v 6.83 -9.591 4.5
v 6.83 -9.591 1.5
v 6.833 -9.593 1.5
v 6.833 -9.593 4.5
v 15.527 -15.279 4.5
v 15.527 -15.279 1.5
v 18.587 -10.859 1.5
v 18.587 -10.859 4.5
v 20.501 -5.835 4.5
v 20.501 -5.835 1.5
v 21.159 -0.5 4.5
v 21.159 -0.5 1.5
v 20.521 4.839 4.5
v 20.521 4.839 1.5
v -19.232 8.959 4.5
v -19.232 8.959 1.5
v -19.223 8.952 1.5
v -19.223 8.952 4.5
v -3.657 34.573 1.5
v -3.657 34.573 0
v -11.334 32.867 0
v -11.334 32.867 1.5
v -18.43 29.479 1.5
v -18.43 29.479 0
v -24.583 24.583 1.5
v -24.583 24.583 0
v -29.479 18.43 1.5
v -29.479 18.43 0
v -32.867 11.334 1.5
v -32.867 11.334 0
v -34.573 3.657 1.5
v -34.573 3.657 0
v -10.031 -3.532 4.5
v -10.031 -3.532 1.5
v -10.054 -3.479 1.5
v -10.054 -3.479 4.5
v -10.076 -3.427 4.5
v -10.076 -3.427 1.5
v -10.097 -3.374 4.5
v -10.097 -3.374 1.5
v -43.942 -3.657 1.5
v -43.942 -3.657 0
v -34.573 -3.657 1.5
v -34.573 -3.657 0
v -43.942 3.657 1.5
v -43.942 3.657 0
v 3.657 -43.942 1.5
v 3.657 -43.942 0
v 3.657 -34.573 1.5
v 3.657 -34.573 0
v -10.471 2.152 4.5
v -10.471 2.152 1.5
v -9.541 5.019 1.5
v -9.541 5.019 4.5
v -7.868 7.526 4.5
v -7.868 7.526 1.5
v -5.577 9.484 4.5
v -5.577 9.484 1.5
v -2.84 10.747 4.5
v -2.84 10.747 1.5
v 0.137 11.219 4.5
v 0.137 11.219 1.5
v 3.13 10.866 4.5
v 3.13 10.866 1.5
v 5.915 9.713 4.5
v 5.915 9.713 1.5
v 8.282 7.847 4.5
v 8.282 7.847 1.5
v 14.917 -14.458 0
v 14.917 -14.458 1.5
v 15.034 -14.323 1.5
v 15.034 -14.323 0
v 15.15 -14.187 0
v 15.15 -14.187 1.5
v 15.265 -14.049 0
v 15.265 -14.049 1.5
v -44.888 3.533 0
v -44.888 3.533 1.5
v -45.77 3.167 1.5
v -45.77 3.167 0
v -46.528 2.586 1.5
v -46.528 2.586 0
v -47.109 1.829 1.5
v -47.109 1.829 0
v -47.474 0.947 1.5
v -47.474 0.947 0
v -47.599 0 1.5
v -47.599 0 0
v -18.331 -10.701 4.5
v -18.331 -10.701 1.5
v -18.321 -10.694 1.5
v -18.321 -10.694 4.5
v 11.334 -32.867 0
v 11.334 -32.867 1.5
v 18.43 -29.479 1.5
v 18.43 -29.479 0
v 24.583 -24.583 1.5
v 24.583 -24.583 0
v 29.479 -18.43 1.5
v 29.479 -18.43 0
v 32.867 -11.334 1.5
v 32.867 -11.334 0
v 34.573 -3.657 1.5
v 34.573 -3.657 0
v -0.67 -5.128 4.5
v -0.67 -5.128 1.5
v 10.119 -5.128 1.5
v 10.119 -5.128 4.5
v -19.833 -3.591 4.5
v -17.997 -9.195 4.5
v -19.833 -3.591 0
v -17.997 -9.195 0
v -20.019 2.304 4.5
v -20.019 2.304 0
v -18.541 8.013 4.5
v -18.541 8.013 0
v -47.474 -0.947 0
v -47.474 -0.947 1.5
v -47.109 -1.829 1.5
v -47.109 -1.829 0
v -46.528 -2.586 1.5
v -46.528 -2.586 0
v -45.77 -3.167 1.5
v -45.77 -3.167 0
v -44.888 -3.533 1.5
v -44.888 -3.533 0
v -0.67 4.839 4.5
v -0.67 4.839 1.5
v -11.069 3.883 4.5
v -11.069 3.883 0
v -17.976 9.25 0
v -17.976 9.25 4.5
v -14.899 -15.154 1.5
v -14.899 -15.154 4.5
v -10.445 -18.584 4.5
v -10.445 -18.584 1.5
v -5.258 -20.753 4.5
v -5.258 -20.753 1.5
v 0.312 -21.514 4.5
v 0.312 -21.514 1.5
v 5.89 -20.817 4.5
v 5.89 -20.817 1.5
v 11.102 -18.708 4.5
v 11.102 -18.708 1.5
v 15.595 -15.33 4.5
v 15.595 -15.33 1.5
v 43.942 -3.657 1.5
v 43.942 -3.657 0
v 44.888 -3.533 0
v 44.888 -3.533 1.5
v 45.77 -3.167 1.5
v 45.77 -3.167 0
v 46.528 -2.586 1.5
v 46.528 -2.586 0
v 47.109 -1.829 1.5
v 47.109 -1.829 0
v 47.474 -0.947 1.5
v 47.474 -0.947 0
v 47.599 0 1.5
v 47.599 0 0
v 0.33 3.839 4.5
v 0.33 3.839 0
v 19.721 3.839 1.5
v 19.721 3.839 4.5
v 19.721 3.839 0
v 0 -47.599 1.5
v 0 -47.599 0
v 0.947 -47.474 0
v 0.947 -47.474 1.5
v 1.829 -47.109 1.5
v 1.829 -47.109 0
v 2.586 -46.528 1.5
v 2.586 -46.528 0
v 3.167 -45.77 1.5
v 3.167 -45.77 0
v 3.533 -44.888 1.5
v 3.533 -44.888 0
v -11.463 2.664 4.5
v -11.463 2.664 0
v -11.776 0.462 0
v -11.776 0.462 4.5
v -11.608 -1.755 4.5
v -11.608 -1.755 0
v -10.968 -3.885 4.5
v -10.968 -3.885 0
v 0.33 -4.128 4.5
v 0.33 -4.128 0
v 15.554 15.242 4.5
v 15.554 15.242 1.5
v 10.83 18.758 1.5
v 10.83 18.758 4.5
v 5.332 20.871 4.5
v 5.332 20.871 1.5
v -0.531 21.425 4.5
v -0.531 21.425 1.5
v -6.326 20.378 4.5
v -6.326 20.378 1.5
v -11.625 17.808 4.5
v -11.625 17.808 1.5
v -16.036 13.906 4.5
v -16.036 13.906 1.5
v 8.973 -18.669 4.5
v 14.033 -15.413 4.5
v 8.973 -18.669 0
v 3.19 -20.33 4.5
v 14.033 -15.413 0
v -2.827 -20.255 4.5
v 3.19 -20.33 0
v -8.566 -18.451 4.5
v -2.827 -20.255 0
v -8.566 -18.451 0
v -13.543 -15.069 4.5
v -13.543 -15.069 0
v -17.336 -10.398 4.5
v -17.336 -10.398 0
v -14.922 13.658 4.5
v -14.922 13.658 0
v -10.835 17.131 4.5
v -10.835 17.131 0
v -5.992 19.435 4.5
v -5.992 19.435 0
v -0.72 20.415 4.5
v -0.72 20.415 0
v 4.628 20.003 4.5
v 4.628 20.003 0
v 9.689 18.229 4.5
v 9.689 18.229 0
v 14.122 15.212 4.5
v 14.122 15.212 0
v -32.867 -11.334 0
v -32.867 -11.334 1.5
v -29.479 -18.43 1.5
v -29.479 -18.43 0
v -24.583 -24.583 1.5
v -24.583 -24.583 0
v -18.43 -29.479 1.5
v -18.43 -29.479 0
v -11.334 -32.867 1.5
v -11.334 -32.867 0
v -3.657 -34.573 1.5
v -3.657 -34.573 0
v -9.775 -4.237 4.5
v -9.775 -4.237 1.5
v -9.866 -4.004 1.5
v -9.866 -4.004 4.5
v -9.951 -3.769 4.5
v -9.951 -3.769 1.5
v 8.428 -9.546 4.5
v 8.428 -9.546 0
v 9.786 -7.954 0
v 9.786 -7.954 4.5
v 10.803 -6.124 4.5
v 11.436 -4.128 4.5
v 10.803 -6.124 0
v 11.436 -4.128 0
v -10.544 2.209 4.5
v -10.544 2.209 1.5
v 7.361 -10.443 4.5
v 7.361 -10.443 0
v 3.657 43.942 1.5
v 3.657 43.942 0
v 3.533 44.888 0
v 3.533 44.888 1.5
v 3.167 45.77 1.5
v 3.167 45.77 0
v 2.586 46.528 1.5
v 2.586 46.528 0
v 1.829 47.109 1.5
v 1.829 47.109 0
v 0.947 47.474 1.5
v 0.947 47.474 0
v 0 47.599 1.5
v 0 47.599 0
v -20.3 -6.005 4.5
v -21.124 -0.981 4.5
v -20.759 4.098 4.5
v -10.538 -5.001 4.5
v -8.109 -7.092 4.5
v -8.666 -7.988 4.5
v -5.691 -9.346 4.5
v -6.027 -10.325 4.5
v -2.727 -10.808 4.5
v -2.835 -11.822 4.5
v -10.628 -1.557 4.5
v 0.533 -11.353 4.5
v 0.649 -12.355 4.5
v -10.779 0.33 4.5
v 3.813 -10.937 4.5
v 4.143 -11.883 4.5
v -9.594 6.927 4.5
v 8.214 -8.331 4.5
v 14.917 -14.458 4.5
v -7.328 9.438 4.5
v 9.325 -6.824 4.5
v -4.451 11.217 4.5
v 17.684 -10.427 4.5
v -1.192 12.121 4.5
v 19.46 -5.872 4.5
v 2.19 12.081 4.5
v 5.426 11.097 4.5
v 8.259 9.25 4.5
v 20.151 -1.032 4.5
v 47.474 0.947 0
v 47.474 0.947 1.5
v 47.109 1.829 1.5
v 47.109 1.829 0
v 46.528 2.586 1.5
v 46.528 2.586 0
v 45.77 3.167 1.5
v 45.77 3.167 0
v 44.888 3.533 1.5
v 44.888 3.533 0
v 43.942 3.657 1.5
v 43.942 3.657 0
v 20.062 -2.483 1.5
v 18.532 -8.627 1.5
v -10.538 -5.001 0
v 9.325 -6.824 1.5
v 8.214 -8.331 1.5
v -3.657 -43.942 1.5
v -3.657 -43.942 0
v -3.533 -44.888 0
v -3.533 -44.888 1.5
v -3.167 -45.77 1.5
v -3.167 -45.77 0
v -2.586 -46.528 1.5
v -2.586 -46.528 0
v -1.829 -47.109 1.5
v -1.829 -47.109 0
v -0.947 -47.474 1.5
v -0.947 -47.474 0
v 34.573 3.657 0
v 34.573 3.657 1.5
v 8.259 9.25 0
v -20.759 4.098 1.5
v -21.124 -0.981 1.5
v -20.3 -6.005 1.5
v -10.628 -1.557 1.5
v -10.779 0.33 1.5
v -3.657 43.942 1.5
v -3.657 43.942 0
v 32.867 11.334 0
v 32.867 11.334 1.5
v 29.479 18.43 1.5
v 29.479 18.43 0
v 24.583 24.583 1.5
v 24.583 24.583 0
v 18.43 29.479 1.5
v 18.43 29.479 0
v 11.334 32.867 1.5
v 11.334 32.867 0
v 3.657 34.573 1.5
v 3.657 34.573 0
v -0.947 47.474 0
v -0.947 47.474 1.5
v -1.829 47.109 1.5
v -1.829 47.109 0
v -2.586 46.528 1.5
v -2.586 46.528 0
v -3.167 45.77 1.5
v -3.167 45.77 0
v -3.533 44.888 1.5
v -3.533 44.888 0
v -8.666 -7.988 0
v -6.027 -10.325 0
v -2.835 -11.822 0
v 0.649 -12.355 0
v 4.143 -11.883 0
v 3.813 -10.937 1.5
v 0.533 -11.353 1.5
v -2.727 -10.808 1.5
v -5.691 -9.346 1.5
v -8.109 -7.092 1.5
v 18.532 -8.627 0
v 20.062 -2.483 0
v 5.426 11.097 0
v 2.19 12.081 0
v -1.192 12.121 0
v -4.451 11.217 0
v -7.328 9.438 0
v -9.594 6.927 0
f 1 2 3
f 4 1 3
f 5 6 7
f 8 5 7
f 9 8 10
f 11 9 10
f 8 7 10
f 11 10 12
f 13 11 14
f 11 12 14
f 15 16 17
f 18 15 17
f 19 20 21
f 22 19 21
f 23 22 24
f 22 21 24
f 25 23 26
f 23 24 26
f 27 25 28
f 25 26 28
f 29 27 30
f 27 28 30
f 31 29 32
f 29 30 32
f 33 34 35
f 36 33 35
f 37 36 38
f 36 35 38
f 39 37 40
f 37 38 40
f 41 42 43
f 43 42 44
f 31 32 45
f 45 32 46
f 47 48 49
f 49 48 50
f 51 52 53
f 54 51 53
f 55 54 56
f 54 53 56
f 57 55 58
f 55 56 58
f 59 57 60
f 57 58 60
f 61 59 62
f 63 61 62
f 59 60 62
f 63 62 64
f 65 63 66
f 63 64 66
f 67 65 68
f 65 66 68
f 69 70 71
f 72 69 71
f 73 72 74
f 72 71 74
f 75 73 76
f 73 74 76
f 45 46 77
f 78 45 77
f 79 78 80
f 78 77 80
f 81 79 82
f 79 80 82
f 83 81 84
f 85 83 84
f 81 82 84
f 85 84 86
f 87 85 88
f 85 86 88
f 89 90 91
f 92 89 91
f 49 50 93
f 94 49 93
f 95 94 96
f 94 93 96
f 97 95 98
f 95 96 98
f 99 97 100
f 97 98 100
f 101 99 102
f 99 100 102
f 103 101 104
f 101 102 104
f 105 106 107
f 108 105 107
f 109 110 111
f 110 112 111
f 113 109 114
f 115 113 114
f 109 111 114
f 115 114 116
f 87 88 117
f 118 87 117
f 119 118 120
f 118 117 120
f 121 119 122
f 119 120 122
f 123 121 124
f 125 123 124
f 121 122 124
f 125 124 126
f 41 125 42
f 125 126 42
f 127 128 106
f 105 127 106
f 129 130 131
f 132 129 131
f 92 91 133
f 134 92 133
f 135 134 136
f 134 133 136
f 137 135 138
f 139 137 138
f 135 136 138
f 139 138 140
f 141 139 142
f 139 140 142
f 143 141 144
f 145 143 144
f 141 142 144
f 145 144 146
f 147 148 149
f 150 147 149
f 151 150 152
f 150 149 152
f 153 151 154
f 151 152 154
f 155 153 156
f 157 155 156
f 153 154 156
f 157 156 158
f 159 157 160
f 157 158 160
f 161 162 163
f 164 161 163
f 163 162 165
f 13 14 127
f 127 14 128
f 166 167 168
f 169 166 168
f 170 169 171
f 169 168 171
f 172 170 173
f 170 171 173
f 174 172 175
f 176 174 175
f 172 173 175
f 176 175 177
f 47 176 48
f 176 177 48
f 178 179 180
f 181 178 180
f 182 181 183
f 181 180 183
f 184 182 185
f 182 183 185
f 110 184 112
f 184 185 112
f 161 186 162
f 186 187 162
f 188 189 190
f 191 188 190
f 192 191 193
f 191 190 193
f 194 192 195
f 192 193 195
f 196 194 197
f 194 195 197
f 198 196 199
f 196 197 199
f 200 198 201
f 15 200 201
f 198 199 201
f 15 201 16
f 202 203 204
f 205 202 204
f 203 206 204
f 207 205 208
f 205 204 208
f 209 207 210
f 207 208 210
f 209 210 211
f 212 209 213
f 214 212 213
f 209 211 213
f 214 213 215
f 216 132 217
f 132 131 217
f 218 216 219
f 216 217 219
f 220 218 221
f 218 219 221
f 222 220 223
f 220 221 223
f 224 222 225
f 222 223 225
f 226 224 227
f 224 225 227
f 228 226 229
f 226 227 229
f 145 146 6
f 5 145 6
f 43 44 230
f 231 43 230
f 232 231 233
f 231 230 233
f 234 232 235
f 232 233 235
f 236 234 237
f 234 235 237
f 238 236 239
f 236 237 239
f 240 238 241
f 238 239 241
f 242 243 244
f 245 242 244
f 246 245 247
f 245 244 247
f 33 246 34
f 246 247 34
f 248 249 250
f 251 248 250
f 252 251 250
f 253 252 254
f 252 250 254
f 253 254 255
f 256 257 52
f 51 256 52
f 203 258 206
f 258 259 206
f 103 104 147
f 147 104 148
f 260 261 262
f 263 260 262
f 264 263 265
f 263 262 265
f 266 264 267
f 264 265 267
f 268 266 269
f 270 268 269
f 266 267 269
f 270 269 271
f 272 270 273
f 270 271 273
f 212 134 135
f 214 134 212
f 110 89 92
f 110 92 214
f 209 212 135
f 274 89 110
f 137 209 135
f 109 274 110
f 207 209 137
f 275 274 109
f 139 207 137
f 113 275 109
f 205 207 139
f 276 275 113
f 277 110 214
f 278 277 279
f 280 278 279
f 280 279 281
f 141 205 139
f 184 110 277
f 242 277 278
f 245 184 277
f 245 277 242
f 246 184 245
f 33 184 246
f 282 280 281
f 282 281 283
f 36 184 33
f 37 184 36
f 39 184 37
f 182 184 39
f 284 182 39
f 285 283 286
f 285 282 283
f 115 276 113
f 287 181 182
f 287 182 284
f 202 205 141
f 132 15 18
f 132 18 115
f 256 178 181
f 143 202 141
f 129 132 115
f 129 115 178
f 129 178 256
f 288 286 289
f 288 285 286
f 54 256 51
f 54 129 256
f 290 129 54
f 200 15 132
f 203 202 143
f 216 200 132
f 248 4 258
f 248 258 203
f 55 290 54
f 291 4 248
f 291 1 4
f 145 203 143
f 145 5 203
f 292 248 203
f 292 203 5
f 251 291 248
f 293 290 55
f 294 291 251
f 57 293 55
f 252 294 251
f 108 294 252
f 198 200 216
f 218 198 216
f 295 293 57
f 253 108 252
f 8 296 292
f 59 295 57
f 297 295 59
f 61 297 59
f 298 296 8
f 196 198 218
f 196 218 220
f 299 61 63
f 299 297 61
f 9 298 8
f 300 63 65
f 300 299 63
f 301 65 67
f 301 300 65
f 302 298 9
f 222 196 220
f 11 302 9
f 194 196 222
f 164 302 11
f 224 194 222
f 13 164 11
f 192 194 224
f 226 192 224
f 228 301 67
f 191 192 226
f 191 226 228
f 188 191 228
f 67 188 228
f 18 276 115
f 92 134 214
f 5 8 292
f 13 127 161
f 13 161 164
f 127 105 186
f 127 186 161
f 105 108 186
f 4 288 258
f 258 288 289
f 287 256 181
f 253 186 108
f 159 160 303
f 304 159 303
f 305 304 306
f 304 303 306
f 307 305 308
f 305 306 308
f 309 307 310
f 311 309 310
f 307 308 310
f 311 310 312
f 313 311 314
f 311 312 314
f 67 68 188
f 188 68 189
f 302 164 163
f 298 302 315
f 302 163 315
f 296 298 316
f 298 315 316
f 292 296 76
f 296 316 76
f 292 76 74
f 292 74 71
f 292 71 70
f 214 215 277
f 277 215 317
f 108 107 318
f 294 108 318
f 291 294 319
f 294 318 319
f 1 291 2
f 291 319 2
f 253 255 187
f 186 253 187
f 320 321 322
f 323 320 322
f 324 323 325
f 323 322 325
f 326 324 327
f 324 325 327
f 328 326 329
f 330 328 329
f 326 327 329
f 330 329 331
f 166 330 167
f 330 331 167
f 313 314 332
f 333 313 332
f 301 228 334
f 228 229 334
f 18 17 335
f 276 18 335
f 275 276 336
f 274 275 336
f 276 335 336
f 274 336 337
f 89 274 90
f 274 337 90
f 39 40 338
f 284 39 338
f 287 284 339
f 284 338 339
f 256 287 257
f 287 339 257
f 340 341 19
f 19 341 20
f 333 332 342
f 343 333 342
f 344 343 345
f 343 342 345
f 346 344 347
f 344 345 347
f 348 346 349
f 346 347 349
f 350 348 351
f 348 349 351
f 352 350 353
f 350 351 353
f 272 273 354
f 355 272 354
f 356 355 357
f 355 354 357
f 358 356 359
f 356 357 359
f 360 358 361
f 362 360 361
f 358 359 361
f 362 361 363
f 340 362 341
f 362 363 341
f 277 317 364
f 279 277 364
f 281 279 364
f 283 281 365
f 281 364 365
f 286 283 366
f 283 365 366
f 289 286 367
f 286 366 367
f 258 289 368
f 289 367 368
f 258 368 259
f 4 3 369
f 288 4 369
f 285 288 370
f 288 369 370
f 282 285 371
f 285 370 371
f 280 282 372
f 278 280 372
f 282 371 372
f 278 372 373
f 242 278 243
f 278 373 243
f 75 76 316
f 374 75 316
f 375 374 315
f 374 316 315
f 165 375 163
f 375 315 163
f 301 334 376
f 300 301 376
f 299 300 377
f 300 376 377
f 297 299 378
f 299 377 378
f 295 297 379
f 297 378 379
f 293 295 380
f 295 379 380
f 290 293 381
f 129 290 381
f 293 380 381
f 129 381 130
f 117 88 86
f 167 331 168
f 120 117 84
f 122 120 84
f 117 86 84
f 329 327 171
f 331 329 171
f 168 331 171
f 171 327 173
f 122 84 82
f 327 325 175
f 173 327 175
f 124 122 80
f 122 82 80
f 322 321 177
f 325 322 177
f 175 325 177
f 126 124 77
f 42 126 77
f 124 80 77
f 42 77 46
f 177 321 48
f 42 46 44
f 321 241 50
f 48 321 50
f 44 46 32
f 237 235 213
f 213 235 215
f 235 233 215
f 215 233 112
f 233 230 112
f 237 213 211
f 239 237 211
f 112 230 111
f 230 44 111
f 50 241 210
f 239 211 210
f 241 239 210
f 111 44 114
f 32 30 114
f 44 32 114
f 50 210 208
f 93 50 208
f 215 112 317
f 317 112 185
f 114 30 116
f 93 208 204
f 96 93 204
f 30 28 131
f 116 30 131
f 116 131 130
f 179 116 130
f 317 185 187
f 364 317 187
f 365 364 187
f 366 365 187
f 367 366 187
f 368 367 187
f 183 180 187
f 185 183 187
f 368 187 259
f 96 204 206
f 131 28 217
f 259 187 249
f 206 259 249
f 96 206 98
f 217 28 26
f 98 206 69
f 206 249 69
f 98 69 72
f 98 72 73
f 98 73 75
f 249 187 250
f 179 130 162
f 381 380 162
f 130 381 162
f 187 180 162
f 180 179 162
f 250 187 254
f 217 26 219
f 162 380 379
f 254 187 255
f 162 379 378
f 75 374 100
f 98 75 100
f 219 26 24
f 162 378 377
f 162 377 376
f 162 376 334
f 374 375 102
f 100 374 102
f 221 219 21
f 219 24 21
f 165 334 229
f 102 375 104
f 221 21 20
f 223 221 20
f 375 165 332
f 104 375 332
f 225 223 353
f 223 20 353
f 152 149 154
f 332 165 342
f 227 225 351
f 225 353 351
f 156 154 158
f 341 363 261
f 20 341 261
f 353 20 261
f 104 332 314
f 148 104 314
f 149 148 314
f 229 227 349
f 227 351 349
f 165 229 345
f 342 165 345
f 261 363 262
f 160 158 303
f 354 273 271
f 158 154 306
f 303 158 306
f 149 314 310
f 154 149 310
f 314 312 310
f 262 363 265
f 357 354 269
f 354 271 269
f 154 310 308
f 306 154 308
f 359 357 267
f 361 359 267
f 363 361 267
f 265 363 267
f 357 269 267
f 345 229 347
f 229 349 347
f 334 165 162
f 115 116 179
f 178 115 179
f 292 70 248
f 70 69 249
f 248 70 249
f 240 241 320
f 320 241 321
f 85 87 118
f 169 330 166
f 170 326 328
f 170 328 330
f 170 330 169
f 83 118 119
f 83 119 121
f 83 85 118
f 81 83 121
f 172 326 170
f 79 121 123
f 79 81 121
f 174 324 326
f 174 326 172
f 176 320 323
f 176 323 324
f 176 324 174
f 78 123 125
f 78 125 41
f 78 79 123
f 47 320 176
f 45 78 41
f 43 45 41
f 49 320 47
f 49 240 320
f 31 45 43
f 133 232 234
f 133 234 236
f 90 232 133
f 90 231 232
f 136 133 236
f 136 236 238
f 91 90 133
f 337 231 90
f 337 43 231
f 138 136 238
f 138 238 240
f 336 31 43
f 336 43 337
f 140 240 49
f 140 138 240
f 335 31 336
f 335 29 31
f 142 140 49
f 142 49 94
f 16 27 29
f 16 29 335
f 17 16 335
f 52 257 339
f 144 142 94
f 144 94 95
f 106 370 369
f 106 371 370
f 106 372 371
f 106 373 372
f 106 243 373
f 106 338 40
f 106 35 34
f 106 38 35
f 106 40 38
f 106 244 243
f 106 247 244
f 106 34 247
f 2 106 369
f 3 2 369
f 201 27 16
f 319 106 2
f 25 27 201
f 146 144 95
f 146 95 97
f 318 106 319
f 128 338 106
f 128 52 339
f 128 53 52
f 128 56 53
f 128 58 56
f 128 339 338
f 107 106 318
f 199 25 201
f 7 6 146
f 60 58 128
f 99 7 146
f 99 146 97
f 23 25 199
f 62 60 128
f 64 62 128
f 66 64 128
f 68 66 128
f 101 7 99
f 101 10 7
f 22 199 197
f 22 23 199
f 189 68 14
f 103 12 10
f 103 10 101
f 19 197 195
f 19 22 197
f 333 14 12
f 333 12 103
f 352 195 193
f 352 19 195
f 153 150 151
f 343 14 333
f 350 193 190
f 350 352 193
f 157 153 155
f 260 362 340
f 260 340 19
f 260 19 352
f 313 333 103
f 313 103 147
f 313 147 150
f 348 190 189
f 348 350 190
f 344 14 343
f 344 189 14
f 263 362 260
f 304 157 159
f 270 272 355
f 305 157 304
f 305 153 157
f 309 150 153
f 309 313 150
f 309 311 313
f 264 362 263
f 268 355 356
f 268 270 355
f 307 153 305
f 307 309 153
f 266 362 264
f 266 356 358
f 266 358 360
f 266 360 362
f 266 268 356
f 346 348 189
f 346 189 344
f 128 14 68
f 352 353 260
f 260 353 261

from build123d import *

# Parameters (mm, degrees)
F1_DEPTH = 3
F3_DEPTH = 25
F5_DEPTH = 6
F6_SCALE = 0.5


with BuildPart() as f1:
    # F0 (on Top) → F1 (new body)
    with BuildSketch(Plane.XY):
        with BuildLine():
            ThreePointArc((69.1465082783, -7.3148026297), (69.4358131239, -3.6624855503), (69.532337402, 0))
            ThreePointArc((69.532337402, 0), (69.4358131239, 3.6624855503), (69.1465082783, 7.3148026297))
            ThreePointArc((69.1465082783, 7.3148026297), (49.1667872887, 49.1667872887), (7.3148026297, 69.1465082783))
            ThreePointArc((7.3148026297, 69.1465082783), (0, 69.532337402), (-7.3148026297, 69.1465082783))
            ThreePointArc((-7.3148026297, 69.1465082783), (-49.1667872887, 49.1667872887), (-69.1465082783, 7.3148026297))
            ThreePointArc((-69.1465082783, 7.3148026297), (-69.532337402, 0), (-69.1465082783, -7.3148026297))
            ThreePointArc((-69.1465082783, -7.3148026297), (-49.1667872887, -49.1667872887), (-7.3148026297, -69.1465082783))
            ThreePointArc((-7.3148026297, -69.1465082783), (0, -69.532337402), (7.3148026297, -69.1465082783))
            ThreePointArc((7.3148026297, -69.1465082783), (49.1667872887, -49.1667872887), (69.1465082783, -7.3148026297))
        make_face()
        with BuildLine():
            ThreePointArc((69.1465082783, 7.3148026297), (69.4358131239, 3.6624855503), (69.532337402, 0))
            ThreePointArc((69.532337402, 0), (69.4358131239, -3.6624855503), (69.1465082783, -7.3148026297))
            Line((69.1465082783, -7.3148026297), (87.8831749798, -7.3148026297))
            ThreePointArc((87.8831749798, -7.3148026297), (93.0555215223, -5.1723465425), (95.1979776095, 0))
            ThreePointArc((95.1979776095, 0), (93.0555215223, 5.1723465425), (87.8831749798, 7.3148026297))
            Line((87.8831749798, 7.3148026297), (69.1465082783, 7.3148026297))
        make_face()
        with BuildLine():
            ThreePointArc((-7.3148026297, 69.1465082783), (0, 69.532337402), (7.3148026297, 69.1465082783))
            Line((7.3148026297, 69.1465082783), (7.3148026297, 87.8831749798))
            ThreePointArc((7.3148026297, 87.8831749798), (5.1723465425, 93.0555215223), (0, 95.1979776095))
            ThreePointArc((0, 95.1979776095), (-5.1723465425, 93.0555215223), (-7.3148026297, 87.8831749798))
            Line((-7.3148026297, 87.8831749798), (-7.3148026297, 69.1465082783))
        make_face()
        with BuildLine():
            Line((7.3148026297, -87.8831749798), (7.3148026297, -69.1465082783))
            ThreePointArc((7.3148026297, -69.1465082783), (0, -69.532337402), (-7.3148026297, -69.1465082783))
            Line((-7.3148026297, -69.1465082783), (-7.3148026297, -87.8831749798))
            ThreePointArc((-7.3148026297, -87.8831749798), (-5.1723465425, -93.0555215223), (0, -95.1979776095))
            ThreePointArc((0, -95.1979776095), (5.1723465425, -93.0555215223), (7.3148026297, -87.8831749798))
        make_face()
        with BuildLine():
            ThreePointArc((-69.1465082783, -7.3148026297), (-69.532337402, 0), (-69.1465082783, 7.3148026297))
            Line((-69.1465082783, 7.3148026297), (-87.8831749798, 7.3148026297))
            ThreePointArc((-87.8831749798, 7.3148026297), (-93.0555215223, 5.1723465425), (-95.1979776095, 0))
            ThreePointArc((-95.1979776095, 0), (-93.0555215223, -5.1723465425), (-87.8831749798, -7.3148026297))
            Line((-87.8831749798, -7.3148026297), (-69.1465082783, -7.3148026297))
        make_face()
    extrude(amount=F1_DEPTH)

    # F2 (on face) → F3 (cut)
    with BuildSketch(Plane.XY.offset(3)):
        with BuildLine():
            Line((16.5183525532, 18.4991825372), (28.2446611673, 30.4242391139))
            ThreePointArc((28.2446611673, 30.4242391139), (-6.7759205764, 40.1934215699), (-35.9519049525, 18.4991825372))
            Line((-35.9519049525, 18.4991825372), (-22.1387110651, 7.7666295692))
            ThreePointArc((-22.1387110651, 7.7666295692), (-5.7075669458, 23.5688666851), (16.5183525532, 18.4991825372))
        make_face()
        with BuildLine():
            Line((0.6598568289, -8.2568302751), (22.8720060756, -8.2568302751))
            ThreePointArc((22.8720060756, -8.2568302751), (20.6804420753, -14.1282137838), (16.8557025786, -19.0928351043))
            Line((16.8557025786, -19.0928351043), (29.8348077707, -28.9163588455))
            ThreePointArc((29.8348077707, -28.9163588455), (30.1844763243, -28.5097115536), (30.5290018042, -28.0986977933))
            ThreePointArc((30.5290018042, -28.0986977933), (39.0530735531, -11.2241482879), (39.4424125552, 7.6771383174))
            Line((39.4424125552, 7.6771383174), (0.6598568289, 7.6771383174))
            Line((0.6598568289, 7.6771383174), (0.6598568289, -8.2568302751))
        make_face()
        with BuildLine():
            ThreePointArc((-21.936269477, -7.7693820931), (-23.5046233838, -1.3017309627), (-22.9253014498, 5.3280979354))
            Line((-22.9253014498, 5.3280979354), (-37.0819843029, 16.0259236856))
            ThreePointArc((-37.0819843029, 16.0259236856), (-40.272638067, -1.3002890528), (-35.9932072461, -18.3901805431))
            Line((-35.9932072461, -18.3901805431), (-21.936269477, -7.7693820931))
        make_face()
        with BuildLine():
            Line((-21.0756994649, -10.0013930179), (-34.6712230282, -20.7951781903))
            ThreePointArc((-34.6712230282, -20.7951781903), (-5.653058159, -40.5104727569), (28.0658900738, -30.8265034109))
            Line((28.0658900738, -30.8265034109), (14.7211225703, -20.8851005882))
            ThreePointArc((14.7211225703, -20.8851005882), (-5.6704095402, -23.6431925936), (-21.0756994649, -10.0013930179))
        make_face()
    extrude(amount=-F3_DEPTH, mode=Mode.SUBTRACT)

    # F4 (on face) → F5 (join)
    with BuildSketch(Plane.XY.offset(3)):
        with BuildLine():
            Line((16.5639953805, 15.693101771), (31.1080969783, 30.4837098063))
            ThreePointArc((31.1080969783, 30.4837098063), (-6.9286387342, 42.198718121), (-38.464639275, 17.9187808608))
            Line((-38.464639275, 17.9187808608), (-38.4463550975, 17.9045744503))
            Line((-38.4463550975, 17.9045744503), (-21.0883413572, 4.4177731062))
            Line((-21.0883413572, 4.4177731062), (-20.9411330852, 4.303395462))
            ThreePointArc((-20.9411330852, 4.303395462), (-5.6797522011, 21.4943554028), (16.5639953805, 15.693101771))
        make_face()
        with BuildLine():
            ThreePointArc((-35.9519049525, 18.4991825372), (-6.7759205764, 40.1934215699), (28.2446611673, 30.4242391139))
            Line((28.2446611673, 30.4242391139), (16.5183525532, 18.4991825372))
            ThreePointArc((16.5183525532, 18.4991825372), (-5.7075669458, 23.5688666851), (-22.1387110651, 7.7666295692))
            Line((-22.1387110651, 7.7666295692), (-35.9519049525, 18.4991825372))
        make_face(mode=Mode.SUBTRACT)
        with BuildLine():
            Line((-19.5500680933, -8.473156722), (-36.6423058309, -21.3872931472))
            ThreePointArc((-36.6423058309, -21.3872931472), (-4.9960373644, -42.6296318895), (31.1903517483, -30.6601496082))
            Line((31.1903517483, -30.6601496082), (31.0539440179, -30.5585304384))
            ThreePointArc((31.0539440179, -30.5585304384), (30.573900942, -31.0902940329), (30.0853848234, -31.6142843735))
            Line((30.0853848234, -31.6142843735), (13.66533039, -19.1864018522))
            ThreePointArc((13.66533039, -19.1864018522), (-5.4535220983, -21.615371302), (-19.5500680933, -8.473156722))
        make_face()
        with BuildLine():
            ThreePointArc((-21.0756994649, -10.0013930179), (-5.6704095402, -23.6431925936), (14.7211225703, -20.8851005882))
            Line((14.7211225703, -20.8851005882), (28.0658900738, -30.8265034109))
            ThreePointArc((28.0658900738, -30.8265034109), (-5.653058159, -40.5104727569), (-34.6712230282, -20.7951781903))
            Line((-34.6712230282, -20.7951781903), (-21.0756994649, -10.0013930179))
        make_face(mode=Mode.SUBTRACT)
        with BuildLine():
            Line((-21.0883413572, 4.4177731062), (-38.4463550975, 17.9045744503))
            ThreePointArc((-38.4463550975, 17.9045744503), (-42.2485928064, -1.9617758618), (-36.6614406796, -21.4017505898))
            Line((-36.6614406796, -21.4017505898), (-36.6423058309, -21.3872931472))
            ThreePointArc((-36.6423058309, -21.3872931472), (-36.9523718103, -20.8420801294), (-37.2545148762, -20.2924368686))
            Line((-37.2545148762, -20.2924368686), (-20.1947009372, -6.7482753745))
            ThreePointArc((-20.1947009372, -6.7482753745), (-21.5038361154, -1.2342638661), (-21.0883413572, 4.4177731062))
        make_face()
        with BuildLine():
            Line((-21.936269477, -7.7693820931), (-35.9932072461, -18.3901805431))
            ThreePointArc((-35.9932072461, -18.3901805431), (-40.272638067, -1.3002890528), (-37.0819843029, 16.0259236856))
            Line((-37.0819843029, 16.0259236856), (-22.9253014498, 5.3280979354))
            ThreePointArc((-22.9253014498, 5.3280979354), (-23.5046233838, -1.3017309627), (-21.936269477, -7.7693820931))
        make_face(mode=Mode.SUBTRACT)
        with BuildLine():
            ThreePointArc((-20.0629168504, -7.0638754616), (-20.1295357126, -6.9063789134), (-20.1947009372, -6.7482753745))
            Line((-20.1947009372, -6.7482753745), (-37.2545148762, -20.2924368686))
            ThreePointArc((-37.2545148762, -20.2924368686), (-36.9523718103, -20.8420801294), (-36.6423058309, -21.3872931472))
            Line((-36.6423058309, -21.3872931472), (-19.5500680933, -8.473156722))
            ThreePointArc((-19.5500680933, -8.473156722), (-19.8181327724, -7.7727520906), (-20.0629168504, -7.0638754616))
        make_face()
        with BuildLine():
            ThreePointArc((14.778628294, -18.4339677859), (14.2275475814, -18.8184235598), (13.66533039, -19.1864018522))
            Line((13.66533039, -19.1864018522), (30.0853848234, -31.6142843735))
            ThreePointArc((30.0853848234, -31.6142843735), (30.573900942, -31.0902940329), (31.0539440179, -30.5585304384))
            Line((31.0539440179, -30.5585304384), (14.778628294, -18.4339677859))
        make_face()
        with BuildLine():
            Line((13.660088258, -19.1824342282), (13.66533039, -19.1864018522))
            ThreePointArc((13.66533039, -19.1864018522), (14.2275475814, -18.8184235598), (14.778628294, -18.4339677859))
            Line((14.778628294, -18.4339677859), (31.0539440179, -30.5585304384))
            ThreePointArc((31.0539440179, -30.5585304384), (41.0029367993, -11.6707107453), (41.0420586495, 9.6771383174))
            Line((41.0420586495, 9.6771383174), (-1.3401431711, 9.6771383174))
            Line((-1.3401431711, 9.6771383174), (-1.3401431711, -10.2568302751))
            Line((-1.3401431711, -10.2568302751), (20.238117635, -10.2568302751))
            ThreePointArc((20.238117635, -10.2568302751), (17.6137295695, -15.2094515931), (13.660088258, -19.1824342282))
        make_face()
        with BuildLine():
            Line((0.6598568289, -8.2568302751), (0.6598568289, 7.6771383174))
            Line((0.6598568289, 7.6771383174), (39.4424125552, 7.6771383174))
            ThreePointArc((39.4424125552, 7.6771383174), (38.9201464557, -11.7437255239), (29.8348077707, -28.9163588455))
            Line((29.8348077707, -28.9163588455), (16.8557025786, -19.0928351043))
            ThreePointArc((16.8557025786, -19.0928351043), (20.6804420753, -14.1282137838), (22.8720060756, -8.2568302751))
            Line((22.8720060756, -8.2568302751), (0.6598568289, -8.2568302751))
        make_face(mode=Mode.SUBTRACT)
    extrude(amount=F5_DEPTH)


with BuildPart() as f1_1:
    # F6: moved
    add(f1.part.scale(F6_SCALE))


solid = f1_1.part
